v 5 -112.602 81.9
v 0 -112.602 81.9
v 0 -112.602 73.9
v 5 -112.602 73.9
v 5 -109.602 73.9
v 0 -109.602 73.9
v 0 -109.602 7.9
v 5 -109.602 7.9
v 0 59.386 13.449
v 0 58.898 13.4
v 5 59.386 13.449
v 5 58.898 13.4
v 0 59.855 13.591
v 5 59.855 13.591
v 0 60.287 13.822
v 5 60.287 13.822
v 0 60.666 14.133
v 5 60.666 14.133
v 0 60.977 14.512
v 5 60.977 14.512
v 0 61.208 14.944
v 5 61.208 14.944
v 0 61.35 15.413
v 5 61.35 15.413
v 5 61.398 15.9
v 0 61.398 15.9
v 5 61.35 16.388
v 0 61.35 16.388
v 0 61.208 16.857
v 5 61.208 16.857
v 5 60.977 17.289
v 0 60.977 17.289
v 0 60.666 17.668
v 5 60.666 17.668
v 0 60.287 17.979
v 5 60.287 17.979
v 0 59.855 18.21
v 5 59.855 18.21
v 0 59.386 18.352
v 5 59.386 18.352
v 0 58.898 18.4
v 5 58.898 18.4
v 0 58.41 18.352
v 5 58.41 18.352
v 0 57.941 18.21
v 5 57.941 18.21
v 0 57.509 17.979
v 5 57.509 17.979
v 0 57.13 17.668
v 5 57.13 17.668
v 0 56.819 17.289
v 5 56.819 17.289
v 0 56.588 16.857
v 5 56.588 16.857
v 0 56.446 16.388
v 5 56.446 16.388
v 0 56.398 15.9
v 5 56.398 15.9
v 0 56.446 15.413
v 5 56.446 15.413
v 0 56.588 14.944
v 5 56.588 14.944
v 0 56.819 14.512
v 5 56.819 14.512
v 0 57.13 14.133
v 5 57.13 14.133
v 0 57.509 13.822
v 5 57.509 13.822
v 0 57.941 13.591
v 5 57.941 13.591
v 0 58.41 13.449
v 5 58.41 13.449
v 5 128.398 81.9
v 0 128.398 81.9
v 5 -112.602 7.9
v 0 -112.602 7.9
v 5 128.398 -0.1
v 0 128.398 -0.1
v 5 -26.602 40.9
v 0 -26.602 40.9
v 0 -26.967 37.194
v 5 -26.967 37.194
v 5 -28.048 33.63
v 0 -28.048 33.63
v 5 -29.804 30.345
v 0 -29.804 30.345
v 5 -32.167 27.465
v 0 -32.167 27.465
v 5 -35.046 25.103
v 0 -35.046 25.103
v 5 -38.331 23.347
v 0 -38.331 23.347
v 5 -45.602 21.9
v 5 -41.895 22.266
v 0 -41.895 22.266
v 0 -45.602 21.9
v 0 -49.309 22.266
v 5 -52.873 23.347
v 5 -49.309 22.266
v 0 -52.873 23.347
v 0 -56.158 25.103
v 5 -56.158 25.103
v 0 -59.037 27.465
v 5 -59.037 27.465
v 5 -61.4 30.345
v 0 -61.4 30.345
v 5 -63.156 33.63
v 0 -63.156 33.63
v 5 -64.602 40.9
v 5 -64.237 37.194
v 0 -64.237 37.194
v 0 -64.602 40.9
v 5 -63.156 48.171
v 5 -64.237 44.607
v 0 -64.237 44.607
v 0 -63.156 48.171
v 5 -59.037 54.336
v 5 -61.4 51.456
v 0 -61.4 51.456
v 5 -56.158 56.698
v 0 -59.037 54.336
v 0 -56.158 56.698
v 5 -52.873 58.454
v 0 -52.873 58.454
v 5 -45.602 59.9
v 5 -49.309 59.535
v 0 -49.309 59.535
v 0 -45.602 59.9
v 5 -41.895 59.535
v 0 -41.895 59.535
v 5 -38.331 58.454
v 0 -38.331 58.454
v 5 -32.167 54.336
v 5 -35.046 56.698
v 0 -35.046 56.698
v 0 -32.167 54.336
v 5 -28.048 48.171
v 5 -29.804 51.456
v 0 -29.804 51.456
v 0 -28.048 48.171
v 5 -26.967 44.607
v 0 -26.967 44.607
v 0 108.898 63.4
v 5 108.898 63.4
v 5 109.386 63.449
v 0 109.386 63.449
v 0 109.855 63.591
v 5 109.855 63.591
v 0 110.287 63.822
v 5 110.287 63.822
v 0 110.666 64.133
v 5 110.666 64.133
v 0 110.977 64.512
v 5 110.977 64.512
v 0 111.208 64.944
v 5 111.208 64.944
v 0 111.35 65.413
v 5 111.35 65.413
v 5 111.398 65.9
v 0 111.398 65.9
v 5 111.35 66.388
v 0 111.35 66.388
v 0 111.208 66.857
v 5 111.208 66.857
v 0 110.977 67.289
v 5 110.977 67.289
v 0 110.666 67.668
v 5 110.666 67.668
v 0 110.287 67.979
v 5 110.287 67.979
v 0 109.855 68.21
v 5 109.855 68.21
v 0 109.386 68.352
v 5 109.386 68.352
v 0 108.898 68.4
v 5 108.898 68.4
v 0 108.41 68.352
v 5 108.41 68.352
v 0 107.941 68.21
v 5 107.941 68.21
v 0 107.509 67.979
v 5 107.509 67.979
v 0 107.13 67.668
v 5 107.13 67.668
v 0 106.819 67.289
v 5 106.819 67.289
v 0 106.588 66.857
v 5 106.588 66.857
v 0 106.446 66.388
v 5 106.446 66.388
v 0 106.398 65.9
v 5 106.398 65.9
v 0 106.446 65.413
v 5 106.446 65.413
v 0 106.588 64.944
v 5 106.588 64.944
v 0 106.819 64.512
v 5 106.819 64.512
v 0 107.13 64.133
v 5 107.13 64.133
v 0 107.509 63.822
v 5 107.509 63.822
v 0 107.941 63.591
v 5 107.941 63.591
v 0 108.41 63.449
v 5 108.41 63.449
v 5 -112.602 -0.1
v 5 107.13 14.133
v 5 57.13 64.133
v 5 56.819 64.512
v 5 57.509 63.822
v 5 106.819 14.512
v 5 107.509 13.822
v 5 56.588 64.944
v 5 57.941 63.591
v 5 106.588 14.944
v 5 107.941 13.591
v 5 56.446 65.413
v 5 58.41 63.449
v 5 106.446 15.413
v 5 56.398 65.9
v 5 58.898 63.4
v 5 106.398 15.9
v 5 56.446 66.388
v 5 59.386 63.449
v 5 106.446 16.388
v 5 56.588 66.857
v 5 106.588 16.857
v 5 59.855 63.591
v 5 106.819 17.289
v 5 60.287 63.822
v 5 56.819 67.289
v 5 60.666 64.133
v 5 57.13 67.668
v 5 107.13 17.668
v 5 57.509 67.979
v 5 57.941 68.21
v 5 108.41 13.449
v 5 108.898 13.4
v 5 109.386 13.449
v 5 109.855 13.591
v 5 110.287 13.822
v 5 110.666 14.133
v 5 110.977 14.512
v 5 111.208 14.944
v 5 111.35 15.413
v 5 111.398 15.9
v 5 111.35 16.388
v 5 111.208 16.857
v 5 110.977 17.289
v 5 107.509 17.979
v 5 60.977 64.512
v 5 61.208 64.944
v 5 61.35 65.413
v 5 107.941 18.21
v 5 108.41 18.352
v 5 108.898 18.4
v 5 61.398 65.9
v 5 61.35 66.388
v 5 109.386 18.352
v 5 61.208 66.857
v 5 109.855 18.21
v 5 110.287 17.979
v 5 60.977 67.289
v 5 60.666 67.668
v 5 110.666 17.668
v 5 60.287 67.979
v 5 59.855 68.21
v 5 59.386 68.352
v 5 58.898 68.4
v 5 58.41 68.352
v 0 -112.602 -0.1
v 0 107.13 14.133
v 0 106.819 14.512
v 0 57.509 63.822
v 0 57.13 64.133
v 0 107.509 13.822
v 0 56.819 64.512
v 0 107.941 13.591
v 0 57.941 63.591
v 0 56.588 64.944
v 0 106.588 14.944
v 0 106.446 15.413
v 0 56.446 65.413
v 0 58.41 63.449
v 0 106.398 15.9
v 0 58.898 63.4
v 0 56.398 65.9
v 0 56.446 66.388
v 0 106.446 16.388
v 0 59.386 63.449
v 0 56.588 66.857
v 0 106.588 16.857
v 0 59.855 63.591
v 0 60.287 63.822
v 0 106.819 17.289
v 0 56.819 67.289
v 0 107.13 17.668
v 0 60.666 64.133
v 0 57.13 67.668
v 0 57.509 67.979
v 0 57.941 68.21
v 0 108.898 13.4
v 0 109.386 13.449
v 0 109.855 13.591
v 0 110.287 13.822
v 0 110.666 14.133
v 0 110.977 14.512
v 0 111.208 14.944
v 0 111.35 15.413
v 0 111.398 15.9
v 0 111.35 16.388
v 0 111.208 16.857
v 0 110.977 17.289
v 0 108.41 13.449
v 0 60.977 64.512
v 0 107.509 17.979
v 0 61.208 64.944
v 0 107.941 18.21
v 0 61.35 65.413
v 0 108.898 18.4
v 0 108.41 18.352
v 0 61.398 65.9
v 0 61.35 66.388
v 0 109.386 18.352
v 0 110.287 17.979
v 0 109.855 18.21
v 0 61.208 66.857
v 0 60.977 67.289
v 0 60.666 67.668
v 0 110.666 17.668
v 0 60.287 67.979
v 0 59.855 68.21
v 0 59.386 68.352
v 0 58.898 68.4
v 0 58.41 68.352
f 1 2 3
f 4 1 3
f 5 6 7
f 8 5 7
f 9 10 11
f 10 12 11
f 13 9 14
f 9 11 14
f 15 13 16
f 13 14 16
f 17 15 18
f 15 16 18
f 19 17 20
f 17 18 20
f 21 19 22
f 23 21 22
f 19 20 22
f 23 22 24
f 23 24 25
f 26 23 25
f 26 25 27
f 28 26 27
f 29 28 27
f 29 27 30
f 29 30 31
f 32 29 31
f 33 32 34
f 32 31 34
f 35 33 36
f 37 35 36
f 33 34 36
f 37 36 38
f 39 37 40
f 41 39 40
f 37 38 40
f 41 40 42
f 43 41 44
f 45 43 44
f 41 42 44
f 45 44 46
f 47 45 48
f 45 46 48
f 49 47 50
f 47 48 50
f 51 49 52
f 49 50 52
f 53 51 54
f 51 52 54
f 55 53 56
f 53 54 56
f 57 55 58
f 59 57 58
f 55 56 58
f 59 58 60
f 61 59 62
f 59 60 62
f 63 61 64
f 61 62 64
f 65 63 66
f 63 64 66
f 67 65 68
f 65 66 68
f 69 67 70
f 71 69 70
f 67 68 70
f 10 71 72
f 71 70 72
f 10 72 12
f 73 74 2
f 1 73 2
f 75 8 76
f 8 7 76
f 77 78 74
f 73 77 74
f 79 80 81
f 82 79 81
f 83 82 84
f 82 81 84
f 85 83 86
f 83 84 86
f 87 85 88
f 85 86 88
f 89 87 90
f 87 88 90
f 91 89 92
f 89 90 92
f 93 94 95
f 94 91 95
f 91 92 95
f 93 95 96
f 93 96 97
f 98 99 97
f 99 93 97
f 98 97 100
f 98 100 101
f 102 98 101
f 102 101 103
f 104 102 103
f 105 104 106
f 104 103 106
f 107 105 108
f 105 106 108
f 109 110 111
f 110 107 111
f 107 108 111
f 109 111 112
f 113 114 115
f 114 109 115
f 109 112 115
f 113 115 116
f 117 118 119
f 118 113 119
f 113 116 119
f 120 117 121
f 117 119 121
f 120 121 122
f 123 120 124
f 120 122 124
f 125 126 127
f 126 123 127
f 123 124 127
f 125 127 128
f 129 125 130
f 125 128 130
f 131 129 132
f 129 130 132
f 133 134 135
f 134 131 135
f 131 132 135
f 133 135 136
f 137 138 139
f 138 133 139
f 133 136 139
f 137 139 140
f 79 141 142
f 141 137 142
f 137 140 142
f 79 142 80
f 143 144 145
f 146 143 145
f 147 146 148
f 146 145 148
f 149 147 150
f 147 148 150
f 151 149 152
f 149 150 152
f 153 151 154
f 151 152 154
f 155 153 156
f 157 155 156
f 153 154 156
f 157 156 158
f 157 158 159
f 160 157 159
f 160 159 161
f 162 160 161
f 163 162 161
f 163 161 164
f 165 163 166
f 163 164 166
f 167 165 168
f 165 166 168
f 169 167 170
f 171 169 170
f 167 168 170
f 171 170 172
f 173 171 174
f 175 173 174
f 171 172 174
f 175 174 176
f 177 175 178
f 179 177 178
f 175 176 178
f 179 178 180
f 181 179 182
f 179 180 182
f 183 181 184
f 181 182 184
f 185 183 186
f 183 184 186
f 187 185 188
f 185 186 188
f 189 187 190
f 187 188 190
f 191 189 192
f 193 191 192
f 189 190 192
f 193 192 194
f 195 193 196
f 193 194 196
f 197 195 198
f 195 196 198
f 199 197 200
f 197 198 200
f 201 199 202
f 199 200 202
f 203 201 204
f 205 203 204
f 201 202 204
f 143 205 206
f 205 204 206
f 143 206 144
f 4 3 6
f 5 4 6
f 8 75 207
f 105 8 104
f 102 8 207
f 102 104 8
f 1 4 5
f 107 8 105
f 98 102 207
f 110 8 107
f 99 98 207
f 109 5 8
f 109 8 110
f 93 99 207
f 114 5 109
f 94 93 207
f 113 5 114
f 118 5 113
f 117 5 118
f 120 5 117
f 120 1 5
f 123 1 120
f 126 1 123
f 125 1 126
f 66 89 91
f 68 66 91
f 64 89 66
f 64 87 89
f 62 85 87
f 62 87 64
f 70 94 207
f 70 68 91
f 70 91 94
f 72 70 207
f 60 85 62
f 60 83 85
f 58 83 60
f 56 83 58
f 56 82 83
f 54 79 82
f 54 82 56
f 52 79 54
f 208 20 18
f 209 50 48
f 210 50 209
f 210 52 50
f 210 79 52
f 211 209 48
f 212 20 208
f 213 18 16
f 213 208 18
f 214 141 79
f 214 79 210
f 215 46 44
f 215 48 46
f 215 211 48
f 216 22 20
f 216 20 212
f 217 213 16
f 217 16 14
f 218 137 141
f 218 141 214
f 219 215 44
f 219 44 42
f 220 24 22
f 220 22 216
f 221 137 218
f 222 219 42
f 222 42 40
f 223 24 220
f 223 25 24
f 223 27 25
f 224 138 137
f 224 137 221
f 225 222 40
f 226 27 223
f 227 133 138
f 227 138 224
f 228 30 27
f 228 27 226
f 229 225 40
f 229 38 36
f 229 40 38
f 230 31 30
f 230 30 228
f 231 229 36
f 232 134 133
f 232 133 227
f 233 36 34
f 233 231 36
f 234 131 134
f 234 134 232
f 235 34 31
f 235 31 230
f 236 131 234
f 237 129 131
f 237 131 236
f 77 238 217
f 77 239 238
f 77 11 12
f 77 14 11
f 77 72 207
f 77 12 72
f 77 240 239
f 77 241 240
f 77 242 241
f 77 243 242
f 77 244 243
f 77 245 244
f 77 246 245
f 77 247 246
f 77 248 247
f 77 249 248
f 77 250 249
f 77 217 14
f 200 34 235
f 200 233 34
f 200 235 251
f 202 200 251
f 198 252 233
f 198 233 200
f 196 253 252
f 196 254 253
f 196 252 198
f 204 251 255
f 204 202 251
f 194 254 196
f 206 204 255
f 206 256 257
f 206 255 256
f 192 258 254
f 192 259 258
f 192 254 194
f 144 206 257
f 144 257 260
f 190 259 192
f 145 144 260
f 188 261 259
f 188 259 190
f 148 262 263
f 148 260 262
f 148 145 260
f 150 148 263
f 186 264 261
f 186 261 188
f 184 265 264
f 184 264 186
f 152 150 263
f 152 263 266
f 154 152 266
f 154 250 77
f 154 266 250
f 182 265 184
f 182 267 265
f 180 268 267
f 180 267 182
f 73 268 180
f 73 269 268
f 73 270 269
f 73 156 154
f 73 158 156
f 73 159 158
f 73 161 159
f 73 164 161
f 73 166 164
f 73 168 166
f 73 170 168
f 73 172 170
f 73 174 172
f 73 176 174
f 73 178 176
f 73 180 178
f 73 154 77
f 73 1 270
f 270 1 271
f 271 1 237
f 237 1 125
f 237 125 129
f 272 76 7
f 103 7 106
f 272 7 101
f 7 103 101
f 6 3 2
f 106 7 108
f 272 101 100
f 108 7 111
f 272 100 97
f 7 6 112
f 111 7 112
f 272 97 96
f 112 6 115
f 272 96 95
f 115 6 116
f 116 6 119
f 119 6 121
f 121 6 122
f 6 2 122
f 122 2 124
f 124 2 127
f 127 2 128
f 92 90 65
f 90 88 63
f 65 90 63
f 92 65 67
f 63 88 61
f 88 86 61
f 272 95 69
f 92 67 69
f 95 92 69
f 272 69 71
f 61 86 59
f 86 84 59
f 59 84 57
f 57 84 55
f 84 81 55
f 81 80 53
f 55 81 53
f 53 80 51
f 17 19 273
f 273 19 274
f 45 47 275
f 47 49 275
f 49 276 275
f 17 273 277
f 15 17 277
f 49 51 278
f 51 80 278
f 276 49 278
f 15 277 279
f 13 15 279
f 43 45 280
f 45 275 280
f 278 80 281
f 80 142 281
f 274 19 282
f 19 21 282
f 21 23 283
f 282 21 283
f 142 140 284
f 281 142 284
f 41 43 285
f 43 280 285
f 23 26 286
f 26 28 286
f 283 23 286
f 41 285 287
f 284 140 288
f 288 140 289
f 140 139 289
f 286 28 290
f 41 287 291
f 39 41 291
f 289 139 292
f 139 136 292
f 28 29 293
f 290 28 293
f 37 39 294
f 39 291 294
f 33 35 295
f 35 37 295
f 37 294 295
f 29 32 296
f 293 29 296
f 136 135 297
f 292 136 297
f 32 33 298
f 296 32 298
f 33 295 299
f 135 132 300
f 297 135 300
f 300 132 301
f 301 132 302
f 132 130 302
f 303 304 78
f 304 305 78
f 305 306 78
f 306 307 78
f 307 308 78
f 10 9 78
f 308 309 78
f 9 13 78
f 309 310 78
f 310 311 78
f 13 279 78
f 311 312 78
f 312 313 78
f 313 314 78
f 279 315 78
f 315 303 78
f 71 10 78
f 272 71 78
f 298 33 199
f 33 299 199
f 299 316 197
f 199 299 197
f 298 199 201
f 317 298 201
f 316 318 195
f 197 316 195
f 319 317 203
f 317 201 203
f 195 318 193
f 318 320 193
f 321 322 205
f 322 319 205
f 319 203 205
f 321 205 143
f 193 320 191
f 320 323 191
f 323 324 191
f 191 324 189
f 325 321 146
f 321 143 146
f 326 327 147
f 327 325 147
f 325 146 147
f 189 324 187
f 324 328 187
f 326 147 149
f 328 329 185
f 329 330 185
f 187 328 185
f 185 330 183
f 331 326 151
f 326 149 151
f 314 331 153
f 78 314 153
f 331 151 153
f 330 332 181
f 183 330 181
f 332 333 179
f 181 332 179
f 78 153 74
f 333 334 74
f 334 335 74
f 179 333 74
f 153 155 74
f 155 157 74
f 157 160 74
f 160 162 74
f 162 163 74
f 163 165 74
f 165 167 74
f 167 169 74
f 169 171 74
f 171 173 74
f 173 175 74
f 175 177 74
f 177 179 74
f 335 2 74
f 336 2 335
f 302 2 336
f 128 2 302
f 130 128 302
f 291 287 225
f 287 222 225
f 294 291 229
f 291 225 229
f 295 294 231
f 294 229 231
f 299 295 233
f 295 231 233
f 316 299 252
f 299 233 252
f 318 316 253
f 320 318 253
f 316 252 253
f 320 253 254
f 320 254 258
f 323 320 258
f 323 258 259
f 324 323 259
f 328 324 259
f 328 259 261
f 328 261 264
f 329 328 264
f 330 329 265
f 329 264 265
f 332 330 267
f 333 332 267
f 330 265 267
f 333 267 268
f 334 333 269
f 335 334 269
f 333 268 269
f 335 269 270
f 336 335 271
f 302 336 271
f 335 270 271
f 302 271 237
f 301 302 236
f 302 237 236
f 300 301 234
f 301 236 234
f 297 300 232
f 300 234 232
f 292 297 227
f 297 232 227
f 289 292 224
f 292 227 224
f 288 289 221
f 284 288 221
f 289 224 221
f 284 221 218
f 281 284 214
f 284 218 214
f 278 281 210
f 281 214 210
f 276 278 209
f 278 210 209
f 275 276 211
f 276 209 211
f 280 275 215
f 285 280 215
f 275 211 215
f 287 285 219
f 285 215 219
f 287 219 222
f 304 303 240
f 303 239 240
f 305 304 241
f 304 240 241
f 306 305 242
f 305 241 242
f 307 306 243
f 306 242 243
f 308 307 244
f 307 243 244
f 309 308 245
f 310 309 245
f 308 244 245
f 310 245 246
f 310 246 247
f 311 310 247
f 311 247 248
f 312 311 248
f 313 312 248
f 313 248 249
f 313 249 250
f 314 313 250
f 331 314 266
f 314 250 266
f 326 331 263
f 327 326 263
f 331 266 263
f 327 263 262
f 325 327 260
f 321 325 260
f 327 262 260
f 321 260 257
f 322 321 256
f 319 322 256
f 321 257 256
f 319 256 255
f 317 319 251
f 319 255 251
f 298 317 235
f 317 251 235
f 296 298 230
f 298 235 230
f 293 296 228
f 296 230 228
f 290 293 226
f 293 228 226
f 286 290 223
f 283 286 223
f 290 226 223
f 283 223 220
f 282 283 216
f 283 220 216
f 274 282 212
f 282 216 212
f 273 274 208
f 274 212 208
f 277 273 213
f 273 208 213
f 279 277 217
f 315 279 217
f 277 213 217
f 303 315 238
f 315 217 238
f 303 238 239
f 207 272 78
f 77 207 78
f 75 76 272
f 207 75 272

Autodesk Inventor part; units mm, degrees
ref_plane "YZ Plane" through (0, 0, 0) normal (1, 0, 0) x (0, 1, 0)
ref_plane "XZ Plane" through (0, 0, 0) normal (0, 1, 0) x (-1, 0, 0)
ref_plane "XY Plane" through (0, 0, 0) normal (0, 0, 1) x (1, 0, 0)
sketch "Sketch1" plane through (0, 0, 0) normal (1, 0, 0) x (0, 1, 0)
  line L0 (128.3979, 81.9005) -> (-112.6021, 81.9005)
  line L1 (-112.6021, 81.9005) -> (-112.6021, -0.0995)
  line L2 (-112.6021, -0.0995) -> (128.3979, -0.0995)
  line L3 (128.3979, -0.0995) -> (128.3979, 81.9005)
  circle A0 centre (-45.6021, 40.9005) radius 19
  line L4 (-112.6021, 73.9005) -> (-109.6021, 73.9005)
  line L5 (-109.6021, 73.9005) -> (-109.6021, 7.9005)
  line L6 (-109.6021, 7.9005) -> (-112.6021, 7.9005)
  line L7 (-112.6021, 7.9005) -> (-112.6021, 73.9005)
  point P0 (0, 0)
  dimension "d0" = 241
  dimension "d1" = 82
  dimension "d2" = 38
  dimension "d3" = 41
  dimension "d4" = 174
  dimension "d5" = 66
  dimension "d6" = 3
  dimension "d7" = 8
extrude "Base" add sketch "Sketch1" along normal blind 5 contours L3 L2 L1 L6 L5 L4 L0
sketch "Sketch2" plane through (5, 0, 0) normal (1, 0, 0) x (0, 0, -1)
  circle A0 centre (-40.9005, -45.6021) radius 19 projected
  circle A1 centre (-65.9005, 108.8979) radius 2.5
  line L0 (-81.9005, 128.3979) -> (-81.9005, -112.6021) construction
  line L1 (0.0995, 128.3979) -> (-81.9005, 128.3979) construction
  line L2 (-81.9005, 128.3979) -> (0.0995, 128.3979) construction
  line L3 (-81.9005, 128.3979) -> (-81.9005, -112.6021) construction
  circle A2 centre (-15.9005, 108.8979) radius 2.5
  circle A3 centre (-65.9005, 58.8979) radius 2.5
  circle A4 centre (-15.9005, 58.8979) radius 2.5
  line L4 (-65.9005, 58.8979) -> (-15.9005, 58.8979) construction
  line L5 (-15.9005, 58.8979) -> (-15.9005, 108.8979) construction
  point P0 (0, 0)
  point P1 (-40.9005, 58.8979)
  dimension "d10" = 5
  dimension "d13" = 50
  dimension "d16" = 50
  dimension "d19" = 19.5
extrude "Bracket holes" cut sketch "Sketch2" against normal up to surface (5 mm away) contours A1 | A2 | A3 | A4
equation "\"d3\" = 0.5 * d1"
equation "\"d7\" = -0.5 * d5 + 0.5 * d1"
properties part number "center wall"
